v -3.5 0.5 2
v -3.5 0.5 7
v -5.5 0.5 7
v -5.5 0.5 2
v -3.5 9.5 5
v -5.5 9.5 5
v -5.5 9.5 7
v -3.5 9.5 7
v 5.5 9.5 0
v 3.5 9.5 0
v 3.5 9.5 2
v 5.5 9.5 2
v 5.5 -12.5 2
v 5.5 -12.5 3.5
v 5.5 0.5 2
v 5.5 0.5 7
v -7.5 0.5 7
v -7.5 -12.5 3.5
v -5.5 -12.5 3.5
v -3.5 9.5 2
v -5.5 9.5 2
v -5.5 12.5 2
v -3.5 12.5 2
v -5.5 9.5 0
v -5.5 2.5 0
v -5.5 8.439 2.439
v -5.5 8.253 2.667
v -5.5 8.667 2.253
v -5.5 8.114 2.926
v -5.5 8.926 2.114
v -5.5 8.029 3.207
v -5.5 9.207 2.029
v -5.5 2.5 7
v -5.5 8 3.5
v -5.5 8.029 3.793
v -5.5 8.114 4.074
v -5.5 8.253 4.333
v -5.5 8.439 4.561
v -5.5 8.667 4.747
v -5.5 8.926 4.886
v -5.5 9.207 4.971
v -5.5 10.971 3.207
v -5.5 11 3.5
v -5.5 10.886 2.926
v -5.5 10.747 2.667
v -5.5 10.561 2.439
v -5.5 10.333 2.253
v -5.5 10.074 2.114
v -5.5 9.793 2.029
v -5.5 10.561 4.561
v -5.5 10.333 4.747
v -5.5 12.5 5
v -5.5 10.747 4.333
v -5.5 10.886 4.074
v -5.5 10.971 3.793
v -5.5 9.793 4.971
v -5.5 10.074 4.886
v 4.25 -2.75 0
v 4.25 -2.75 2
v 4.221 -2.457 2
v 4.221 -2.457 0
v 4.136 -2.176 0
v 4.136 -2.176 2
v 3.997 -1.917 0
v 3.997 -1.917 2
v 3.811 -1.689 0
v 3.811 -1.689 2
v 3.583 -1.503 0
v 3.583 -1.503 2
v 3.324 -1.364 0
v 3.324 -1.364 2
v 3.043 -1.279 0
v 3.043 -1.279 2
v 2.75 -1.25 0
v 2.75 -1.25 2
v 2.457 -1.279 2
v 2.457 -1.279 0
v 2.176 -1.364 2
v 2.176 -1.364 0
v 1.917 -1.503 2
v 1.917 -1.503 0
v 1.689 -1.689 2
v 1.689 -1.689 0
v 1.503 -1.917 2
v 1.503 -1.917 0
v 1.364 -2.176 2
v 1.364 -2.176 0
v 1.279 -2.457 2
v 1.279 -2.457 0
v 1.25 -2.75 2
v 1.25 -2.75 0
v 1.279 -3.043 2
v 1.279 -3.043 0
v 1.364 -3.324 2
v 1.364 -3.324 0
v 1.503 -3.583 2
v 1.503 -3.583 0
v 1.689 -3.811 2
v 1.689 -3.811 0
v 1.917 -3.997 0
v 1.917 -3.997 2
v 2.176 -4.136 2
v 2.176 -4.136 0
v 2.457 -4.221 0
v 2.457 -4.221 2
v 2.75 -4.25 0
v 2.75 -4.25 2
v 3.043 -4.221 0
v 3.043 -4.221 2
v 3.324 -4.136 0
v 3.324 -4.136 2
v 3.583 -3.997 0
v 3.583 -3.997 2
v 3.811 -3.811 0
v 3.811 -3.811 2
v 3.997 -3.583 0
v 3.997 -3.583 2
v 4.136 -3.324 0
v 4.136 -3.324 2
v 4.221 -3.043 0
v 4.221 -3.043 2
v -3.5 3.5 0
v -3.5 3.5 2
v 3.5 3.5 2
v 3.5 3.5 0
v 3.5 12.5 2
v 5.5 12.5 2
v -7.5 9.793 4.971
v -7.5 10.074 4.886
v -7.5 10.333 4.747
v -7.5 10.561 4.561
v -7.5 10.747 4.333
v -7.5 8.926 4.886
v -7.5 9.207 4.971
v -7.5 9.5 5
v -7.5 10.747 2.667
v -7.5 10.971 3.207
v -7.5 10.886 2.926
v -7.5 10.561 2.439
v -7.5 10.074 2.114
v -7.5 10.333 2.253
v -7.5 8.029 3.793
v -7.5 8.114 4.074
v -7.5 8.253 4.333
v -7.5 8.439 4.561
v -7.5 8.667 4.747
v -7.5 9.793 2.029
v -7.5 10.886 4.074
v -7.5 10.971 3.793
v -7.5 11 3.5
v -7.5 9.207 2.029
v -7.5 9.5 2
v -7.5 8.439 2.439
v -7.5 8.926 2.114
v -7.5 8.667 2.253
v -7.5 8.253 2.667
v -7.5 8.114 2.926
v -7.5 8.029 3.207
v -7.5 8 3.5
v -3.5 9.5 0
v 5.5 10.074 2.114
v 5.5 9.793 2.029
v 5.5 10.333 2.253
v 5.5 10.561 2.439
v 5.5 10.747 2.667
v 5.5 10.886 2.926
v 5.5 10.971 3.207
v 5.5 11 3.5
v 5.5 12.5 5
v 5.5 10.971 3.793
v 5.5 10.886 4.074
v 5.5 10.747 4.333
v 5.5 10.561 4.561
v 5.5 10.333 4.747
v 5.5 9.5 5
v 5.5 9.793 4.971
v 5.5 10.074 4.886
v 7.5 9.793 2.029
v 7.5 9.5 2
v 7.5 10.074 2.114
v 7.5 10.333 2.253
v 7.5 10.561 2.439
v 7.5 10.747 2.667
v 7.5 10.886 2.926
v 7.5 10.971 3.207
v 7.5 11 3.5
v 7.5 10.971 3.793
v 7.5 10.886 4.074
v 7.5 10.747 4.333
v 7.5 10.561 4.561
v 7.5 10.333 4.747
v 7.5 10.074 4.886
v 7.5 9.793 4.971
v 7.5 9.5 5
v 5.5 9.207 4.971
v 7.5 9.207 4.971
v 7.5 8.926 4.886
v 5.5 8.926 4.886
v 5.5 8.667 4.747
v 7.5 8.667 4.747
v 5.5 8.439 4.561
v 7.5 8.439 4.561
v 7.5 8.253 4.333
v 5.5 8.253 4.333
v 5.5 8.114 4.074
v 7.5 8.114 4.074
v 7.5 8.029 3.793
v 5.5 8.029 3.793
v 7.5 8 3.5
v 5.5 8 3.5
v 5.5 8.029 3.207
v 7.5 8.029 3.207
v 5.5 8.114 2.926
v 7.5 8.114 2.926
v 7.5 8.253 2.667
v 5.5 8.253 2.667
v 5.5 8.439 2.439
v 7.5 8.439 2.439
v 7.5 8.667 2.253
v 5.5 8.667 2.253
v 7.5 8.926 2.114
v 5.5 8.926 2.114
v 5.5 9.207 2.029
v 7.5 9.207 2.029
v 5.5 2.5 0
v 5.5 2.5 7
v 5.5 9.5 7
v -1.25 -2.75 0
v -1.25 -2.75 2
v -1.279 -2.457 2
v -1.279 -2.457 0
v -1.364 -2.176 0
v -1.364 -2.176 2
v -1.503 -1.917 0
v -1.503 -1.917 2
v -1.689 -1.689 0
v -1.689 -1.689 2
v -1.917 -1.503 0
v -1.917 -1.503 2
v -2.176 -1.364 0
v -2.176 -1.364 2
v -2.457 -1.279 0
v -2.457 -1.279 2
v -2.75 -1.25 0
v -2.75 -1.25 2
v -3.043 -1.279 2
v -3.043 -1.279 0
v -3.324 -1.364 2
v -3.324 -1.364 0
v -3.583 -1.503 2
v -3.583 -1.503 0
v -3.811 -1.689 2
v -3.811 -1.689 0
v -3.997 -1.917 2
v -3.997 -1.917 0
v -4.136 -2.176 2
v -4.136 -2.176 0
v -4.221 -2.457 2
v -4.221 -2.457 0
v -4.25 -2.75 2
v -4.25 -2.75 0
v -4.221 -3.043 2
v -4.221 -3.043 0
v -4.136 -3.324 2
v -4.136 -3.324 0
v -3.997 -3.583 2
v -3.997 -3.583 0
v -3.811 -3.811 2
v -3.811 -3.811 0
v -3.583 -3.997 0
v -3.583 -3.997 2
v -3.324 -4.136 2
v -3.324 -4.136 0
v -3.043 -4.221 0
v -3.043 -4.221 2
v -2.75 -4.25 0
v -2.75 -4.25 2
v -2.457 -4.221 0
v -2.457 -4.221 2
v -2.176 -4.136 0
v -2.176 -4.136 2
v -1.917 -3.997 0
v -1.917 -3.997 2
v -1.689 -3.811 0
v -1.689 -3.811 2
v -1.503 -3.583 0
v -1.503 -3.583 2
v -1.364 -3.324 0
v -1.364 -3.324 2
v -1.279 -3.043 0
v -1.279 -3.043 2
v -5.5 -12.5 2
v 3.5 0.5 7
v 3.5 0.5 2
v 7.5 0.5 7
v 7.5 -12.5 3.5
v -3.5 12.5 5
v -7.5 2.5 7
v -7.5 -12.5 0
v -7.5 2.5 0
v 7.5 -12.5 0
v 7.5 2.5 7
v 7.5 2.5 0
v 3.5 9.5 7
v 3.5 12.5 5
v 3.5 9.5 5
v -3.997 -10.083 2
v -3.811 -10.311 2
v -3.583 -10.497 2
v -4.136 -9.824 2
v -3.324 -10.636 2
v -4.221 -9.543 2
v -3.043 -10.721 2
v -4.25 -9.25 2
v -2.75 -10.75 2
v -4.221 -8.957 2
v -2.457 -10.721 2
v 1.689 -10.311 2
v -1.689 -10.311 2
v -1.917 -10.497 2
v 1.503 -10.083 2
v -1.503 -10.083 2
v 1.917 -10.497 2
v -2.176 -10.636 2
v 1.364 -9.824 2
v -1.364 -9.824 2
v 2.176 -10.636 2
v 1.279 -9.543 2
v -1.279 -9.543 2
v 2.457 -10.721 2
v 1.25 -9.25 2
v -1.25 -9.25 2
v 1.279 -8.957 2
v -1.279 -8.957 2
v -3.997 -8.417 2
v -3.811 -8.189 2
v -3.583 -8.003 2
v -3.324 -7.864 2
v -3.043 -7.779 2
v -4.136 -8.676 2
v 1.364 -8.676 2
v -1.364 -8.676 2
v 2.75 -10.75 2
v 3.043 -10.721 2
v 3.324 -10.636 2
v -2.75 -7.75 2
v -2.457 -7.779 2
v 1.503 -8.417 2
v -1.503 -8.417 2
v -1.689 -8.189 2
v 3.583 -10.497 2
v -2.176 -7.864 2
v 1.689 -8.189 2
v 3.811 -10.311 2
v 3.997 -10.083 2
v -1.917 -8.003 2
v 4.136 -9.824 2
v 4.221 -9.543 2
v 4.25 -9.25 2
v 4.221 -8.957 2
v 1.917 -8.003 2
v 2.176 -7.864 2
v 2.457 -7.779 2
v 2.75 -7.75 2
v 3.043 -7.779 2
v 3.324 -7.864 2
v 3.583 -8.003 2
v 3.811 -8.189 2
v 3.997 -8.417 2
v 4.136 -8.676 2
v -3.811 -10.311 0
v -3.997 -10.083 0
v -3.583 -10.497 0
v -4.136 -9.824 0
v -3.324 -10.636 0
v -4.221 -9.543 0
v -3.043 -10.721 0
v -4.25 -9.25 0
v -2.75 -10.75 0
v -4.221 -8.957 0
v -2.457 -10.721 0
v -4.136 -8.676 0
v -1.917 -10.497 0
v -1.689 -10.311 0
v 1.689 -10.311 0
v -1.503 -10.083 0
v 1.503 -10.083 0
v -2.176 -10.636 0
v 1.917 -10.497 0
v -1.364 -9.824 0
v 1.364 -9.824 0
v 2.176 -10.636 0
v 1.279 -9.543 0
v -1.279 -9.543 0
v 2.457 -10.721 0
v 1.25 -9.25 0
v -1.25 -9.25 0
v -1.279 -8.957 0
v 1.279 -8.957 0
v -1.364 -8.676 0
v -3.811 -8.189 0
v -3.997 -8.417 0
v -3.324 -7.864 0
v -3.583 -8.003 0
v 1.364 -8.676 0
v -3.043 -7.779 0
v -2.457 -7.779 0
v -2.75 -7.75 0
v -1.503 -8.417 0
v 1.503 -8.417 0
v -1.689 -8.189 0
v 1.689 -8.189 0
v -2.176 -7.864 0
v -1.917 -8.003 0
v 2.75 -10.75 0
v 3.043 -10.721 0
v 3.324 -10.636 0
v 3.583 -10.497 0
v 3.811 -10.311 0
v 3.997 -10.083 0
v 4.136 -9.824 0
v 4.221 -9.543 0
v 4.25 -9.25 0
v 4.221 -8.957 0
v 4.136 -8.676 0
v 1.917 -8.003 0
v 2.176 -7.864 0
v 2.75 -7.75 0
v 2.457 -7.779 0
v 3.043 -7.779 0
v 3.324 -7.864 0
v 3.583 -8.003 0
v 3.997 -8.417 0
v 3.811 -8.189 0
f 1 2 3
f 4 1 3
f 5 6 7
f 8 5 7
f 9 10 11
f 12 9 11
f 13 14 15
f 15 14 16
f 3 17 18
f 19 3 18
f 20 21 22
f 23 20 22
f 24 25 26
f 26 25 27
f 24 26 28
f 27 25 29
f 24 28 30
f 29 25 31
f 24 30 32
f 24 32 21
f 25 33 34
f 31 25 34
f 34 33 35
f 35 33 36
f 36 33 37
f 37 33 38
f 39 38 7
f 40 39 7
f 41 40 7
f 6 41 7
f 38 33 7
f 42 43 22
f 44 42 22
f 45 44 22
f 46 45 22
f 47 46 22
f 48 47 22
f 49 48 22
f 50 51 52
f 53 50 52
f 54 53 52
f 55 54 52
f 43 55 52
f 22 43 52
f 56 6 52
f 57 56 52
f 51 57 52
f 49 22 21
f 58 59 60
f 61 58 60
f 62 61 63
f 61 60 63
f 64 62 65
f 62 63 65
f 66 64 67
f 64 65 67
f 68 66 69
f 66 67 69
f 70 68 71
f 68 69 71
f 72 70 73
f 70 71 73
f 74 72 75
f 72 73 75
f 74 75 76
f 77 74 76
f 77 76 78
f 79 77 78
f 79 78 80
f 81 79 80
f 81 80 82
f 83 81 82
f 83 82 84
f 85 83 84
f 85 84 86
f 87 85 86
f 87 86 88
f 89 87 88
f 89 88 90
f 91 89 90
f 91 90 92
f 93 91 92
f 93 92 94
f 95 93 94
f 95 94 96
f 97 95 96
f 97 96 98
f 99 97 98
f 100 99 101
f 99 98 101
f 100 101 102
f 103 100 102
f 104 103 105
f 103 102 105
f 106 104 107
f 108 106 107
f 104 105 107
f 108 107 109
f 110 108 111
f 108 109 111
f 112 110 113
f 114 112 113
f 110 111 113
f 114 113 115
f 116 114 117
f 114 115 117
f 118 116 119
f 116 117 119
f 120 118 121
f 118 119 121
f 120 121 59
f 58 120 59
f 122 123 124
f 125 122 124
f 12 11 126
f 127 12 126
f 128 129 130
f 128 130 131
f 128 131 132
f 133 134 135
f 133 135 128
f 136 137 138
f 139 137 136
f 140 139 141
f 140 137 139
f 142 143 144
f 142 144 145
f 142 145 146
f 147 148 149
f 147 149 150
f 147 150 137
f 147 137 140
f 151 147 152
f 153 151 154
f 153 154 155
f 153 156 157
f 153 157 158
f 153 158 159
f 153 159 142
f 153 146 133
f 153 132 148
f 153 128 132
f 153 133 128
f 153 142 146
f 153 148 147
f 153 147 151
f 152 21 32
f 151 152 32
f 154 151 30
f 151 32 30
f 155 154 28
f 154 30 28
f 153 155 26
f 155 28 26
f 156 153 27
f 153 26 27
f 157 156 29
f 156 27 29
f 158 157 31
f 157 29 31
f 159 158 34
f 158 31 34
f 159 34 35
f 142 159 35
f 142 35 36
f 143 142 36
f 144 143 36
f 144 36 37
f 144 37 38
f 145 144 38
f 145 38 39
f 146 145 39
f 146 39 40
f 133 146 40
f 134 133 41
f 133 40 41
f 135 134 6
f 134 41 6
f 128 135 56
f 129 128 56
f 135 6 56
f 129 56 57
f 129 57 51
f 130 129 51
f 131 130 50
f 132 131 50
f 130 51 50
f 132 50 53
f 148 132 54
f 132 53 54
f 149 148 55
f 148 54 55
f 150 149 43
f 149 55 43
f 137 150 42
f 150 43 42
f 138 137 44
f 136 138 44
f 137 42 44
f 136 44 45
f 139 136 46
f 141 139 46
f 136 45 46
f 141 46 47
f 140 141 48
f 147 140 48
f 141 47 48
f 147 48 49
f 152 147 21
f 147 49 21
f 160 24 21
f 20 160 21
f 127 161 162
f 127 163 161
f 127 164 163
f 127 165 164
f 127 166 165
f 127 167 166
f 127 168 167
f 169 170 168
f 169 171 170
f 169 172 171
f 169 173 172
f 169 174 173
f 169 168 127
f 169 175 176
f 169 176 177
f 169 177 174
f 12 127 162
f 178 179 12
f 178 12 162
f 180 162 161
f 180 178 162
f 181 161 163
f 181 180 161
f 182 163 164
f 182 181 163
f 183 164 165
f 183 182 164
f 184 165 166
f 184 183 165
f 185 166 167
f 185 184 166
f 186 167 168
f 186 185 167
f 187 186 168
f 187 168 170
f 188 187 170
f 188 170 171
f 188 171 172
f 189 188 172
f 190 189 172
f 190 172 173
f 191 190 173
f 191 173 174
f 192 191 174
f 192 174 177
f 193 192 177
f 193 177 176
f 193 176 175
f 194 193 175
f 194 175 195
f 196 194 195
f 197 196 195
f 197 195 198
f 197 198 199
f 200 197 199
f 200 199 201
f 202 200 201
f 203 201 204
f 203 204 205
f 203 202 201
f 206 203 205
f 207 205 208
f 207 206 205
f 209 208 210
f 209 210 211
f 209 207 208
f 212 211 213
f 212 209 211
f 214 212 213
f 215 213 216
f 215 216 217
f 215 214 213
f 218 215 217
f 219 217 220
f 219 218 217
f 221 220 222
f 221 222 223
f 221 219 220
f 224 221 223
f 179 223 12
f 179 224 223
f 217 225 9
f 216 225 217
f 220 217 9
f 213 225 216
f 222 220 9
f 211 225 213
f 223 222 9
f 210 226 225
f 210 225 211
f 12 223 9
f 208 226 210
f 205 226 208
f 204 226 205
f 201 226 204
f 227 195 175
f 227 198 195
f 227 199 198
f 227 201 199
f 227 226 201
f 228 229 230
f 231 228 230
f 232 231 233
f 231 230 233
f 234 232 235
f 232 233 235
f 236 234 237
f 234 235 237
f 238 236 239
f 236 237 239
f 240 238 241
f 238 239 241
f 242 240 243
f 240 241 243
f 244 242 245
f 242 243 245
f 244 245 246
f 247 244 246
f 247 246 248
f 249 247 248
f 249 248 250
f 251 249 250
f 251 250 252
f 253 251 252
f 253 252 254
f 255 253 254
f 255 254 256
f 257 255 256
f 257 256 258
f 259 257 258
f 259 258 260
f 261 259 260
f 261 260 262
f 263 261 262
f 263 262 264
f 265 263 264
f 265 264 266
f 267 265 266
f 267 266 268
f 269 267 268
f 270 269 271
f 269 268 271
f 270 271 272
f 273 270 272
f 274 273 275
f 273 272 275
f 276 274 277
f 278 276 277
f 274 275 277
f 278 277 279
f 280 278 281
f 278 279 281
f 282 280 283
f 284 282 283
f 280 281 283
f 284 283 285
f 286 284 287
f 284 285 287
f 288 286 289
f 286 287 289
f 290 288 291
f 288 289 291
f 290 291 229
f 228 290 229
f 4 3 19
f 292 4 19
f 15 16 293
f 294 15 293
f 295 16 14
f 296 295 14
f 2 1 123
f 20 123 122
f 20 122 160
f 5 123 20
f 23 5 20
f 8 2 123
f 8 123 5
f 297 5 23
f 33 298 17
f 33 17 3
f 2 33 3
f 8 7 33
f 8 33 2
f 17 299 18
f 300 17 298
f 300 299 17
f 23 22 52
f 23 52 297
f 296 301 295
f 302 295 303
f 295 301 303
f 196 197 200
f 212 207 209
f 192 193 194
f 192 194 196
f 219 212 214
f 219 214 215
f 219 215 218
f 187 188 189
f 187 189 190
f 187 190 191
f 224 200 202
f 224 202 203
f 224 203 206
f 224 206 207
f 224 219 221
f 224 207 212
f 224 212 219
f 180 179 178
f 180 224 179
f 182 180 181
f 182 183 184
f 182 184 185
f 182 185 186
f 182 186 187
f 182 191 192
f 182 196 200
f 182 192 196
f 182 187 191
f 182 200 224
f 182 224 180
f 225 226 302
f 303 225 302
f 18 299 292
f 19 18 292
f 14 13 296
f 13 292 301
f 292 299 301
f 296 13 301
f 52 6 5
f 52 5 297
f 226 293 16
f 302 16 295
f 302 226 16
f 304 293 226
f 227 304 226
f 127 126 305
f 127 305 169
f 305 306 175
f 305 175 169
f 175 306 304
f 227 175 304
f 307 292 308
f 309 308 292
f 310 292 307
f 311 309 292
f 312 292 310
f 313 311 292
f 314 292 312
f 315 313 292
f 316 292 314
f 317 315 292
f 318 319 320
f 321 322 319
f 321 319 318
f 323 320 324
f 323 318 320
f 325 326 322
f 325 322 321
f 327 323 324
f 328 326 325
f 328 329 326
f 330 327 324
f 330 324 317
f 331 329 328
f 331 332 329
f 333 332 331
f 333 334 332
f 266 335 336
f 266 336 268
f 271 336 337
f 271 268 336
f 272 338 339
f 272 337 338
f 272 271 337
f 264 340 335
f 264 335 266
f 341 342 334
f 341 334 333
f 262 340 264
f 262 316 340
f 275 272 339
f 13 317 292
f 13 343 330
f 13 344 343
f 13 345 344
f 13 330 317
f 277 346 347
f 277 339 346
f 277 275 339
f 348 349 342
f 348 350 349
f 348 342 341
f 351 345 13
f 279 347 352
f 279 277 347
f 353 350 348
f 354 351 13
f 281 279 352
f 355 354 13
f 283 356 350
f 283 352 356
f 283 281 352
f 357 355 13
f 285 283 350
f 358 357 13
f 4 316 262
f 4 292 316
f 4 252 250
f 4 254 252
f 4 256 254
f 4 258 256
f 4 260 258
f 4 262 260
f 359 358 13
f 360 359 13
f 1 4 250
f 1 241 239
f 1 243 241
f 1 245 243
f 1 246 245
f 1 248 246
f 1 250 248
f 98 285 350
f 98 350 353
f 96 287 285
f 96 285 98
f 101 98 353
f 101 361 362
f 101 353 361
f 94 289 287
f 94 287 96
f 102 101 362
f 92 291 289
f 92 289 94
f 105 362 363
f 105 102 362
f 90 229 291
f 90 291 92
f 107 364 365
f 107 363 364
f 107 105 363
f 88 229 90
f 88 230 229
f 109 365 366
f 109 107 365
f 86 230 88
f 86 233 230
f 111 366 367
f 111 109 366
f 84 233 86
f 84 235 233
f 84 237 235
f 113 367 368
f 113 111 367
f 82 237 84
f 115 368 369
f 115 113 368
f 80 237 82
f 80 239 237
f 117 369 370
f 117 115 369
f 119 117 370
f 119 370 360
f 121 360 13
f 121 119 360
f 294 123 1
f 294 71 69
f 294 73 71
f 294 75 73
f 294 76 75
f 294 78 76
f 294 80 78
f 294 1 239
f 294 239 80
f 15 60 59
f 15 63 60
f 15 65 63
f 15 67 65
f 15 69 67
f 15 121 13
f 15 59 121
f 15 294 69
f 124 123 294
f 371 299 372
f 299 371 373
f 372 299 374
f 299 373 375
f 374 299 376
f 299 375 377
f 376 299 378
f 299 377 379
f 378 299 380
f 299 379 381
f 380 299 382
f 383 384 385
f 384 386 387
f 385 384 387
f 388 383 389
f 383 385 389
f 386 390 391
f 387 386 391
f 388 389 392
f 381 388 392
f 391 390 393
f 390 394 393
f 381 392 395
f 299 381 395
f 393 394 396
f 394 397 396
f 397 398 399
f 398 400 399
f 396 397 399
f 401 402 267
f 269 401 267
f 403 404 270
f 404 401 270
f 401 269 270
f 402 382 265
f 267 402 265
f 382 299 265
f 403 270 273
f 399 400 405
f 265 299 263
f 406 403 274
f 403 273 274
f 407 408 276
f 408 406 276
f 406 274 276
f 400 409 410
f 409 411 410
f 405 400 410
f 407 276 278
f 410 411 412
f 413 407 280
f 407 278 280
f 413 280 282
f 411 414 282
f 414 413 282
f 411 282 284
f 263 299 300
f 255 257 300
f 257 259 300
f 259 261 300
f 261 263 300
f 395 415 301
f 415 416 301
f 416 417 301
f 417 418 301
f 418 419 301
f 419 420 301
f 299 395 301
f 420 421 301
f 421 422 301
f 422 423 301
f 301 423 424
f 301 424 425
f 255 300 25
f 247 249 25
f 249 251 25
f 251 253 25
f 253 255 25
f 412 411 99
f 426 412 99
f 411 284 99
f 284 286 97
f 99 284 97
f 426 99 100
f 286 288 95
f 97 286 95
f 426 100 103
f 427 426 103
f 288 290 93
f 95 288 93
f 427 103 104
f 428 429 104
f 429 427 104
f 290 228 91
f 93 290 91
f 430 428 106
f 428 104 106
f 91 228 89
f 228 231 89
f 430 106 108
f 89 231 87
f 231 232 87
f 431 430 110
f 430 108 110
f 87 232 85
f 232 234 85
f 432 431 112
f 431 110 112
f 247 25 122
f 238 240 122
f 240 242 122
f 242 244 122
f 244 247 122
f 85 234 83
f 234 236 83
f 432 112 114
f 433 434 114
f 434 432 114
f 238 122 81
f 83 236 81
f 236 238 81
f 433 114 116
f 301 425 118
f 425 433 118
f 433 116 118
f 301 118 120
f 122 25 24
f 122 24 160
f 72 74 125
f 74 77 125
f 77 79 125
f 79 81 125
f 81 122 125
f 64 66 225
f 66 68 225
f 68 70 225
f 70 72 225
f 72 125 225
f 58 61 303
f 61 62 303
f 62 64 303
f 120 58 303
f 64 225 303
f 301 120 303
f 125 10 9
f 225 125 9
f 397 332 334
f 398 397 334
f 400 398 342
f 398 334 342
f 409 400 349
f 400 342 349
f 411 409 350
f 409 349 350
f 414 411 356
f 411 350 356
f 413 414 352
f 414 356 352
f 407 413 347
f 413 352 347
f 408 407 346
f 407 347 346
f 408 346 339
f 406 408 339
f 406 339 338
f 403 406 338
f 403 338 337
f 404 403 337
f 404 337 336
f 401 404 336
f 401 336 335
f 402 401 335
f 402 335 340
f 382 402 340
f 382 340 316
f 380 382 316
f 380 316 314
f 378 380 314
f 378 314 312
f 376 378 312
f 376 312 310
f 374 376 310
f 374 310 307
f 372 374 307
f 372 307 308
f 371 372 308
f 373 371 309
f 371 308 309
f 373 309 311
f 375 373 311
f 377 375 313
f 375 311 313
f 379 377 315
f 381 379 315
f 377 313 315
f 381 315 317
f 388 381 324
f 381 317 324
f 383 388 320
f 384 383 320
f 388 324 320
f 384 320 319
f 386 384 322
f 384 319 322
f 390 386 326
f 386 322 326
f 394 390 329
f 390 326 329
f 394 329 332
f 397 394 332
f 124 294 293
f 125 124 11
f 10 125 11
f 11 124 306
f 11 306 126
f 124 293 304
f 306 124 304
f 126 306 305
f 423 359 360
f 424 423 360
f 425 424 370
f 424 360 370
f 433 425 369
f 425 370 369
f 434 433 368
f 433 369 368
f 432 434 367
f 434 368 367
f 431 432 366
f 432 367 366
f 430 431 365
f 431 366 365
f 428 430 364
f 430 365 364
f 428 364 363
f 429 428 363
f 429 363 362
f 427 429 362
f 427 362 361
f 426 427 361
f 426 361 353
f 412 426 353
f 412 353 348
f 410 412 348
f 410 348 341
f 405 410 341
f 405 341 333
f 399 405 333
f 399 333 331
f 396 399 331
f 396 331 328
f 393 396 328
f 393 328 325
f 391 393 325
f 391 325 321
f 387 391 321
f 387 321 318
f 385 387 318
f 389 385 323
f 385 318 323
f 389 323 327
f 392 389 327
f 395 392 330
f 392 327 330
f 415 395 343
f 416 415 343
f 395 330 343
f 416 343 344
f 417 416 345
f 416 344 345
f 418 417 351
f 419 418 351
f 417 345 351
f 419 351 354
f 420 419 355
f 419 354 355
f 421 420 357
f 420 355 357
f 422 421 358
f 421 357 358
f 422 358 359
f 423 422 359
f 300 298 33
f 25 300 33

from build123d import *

# Parameters (mm, degrees)
SKETCH_1_W          = 15
SKETCH_1_H          = 25
EXTRUDE_1_DEPTH     = 7
CUT_EXTRUDE_1_DEPTH = 5
SKETCH_3_W          = 2
SKETCH_3_H          = 10
CUT_EXTRUDE_2_DEPTH = 13
SKETCH_4_W          = 2
SKETCH_4_H          = 3
CUT_EXTRUDE_3_DEPTH = 20.345542122
SKETCH_5_W          = 7
SKETCH_5_H          = 6
CUT_EXTRUDE_4_DEPTH = 13
SKETCH_6_R          = 1.5
EXTRUDE_2_DEPTH     = 2
EXTRUDE_START       = 2
SKETCH_7_R          = 1.5
EXTRUDE_3_DEPTH     = 2
CUT_EXTRUDE_5_DEPTH = 21.742468513
SKETCH_9_R          = 1.5
CUT_EXTRUDE_6_DEPTH = 16.411035007


with BuildPart() as part:
    # Эскиз1 → Бобышка-Вытянуть1 (new body)
    with BuildSketch(Plane.XY):
        Rectangle(SKETCH_1_W, SKETCH_1_H)
    extrude(amount=EXTRUDE_1_DEPTH)

    # Эскиз2 → Вырез-Вытянуть1 (cut)
    with BuildSketch(Plane.XY.offset(7)):
        Polygon((-3.5, 0.5), (-5.5, 0.5), (-5.5, -12.5), (5.5, -12.5), (5.5, 0.5), (3.5, 0.5), (3.5, 12.5), (-3.5, 12.5), align=None)
    extrude(amount=-CUT_EXTRUDE_1_DEPTH, mode=Mode.SUBTRACT)

    # Эскиз3 → Вырез-Вытянуть2 (cut)
    with BuildSketch(Plane.XY.offset(7)):
        with Locations((-6.5, 7.5)):
            Rectangle(SKETCH_3_W, SKETCH_3_H)
        with Locations((6.5, 7.5)):
            Rectangle(SKETCH_3_W, SKETCH_3_H)
    extrude(amount=-CUT_EXTRUDE_2_DEPTH, mode=Mode.SUBTRACT)

    # Эскиз4 → Вырез-Вытянуть3 (cut, through all)
    with BuildSketch(Plane.ZY.offset(5.5)):
        with Locations((6, 11)):
            Rectangle(SKETCH_4_W, SKETCH_4_H)
        with Locations((1, 11)):
            Rectangle(SKETCH_4_W, SKETCH_4_H)
    extrude(amount=-CUT_EXTRUDE_3_DEPTH, mode=Mode.SUBTRACT)

    # Эскиз5 → Вырез-Вытянуть4 (cut)
    with BuildSketch(Plane.XY.offset(2)):
        with Locations((0, 6.5)):
            Rectangle(SKETCH_5_W, SKETCH_5_H)
    extrude(amount=-CUT_EXTRUDE_4_DEPTH, mode=Mode.SUBTRACT)

    # Эскиз6 → Бобышка-Вытянуть2 (add)
    with BuildSketch(Plane.ZY.offset(5.5)):
        with Locations(Location((3.5, 9.5, 0), (0, 0, 180))):
            Circle(SKETCH_6_R)
    extrude(amount=EXTRUDE_2_DEPTH)

    # Эскиз7 → Бобышка-Вытянуть3 (add)
    with BuildSketch(Plane(origin=(5.5, 0, 0), x_dir=(0, 0, -1), z_dir=(1, 0, 0)).offset(EXTRUDE_START)):
        with Locations((-3.5, 9.5)):
            Circle(SKETCH_7_R)
    extrude(amount=-EXTRUDE_3_DEPTH)

    # Эскиз8 → Вырез-Вытянуть5 (cut, through all)
    with BuildSketch(Plane.ZY.offset(7.5)):
        Polygon((7, 0.5), (3.5, -12.5), (7, -12.5), align=None)
    extrude(amount=-CUT_EXTRUDE_5_DEPTH, mode=Mode.SUBTRACT)

    # Эскиз9 → Вырез-Вытянуть6 (cut, through all)
    with BuildSketch(Plane.XY.offset(2)):
        with Locations((-2.75, -2.75)):
            Circle(SKETCH_9_R)
        with Locations((2.75, -2.75)):
            Circle(SKETCH_9_R)
        with Locations((-2.75, -9.25)):
            Circle(SKETCH_9_R)
        with Locations((2.75, -9.25)):
            Circle(SKETCH_9_R)
    extrude(amount=-CUT_EXTRUDE_6_DEPTH, mode=Mode.SUBTRACT)


solid = part.part
